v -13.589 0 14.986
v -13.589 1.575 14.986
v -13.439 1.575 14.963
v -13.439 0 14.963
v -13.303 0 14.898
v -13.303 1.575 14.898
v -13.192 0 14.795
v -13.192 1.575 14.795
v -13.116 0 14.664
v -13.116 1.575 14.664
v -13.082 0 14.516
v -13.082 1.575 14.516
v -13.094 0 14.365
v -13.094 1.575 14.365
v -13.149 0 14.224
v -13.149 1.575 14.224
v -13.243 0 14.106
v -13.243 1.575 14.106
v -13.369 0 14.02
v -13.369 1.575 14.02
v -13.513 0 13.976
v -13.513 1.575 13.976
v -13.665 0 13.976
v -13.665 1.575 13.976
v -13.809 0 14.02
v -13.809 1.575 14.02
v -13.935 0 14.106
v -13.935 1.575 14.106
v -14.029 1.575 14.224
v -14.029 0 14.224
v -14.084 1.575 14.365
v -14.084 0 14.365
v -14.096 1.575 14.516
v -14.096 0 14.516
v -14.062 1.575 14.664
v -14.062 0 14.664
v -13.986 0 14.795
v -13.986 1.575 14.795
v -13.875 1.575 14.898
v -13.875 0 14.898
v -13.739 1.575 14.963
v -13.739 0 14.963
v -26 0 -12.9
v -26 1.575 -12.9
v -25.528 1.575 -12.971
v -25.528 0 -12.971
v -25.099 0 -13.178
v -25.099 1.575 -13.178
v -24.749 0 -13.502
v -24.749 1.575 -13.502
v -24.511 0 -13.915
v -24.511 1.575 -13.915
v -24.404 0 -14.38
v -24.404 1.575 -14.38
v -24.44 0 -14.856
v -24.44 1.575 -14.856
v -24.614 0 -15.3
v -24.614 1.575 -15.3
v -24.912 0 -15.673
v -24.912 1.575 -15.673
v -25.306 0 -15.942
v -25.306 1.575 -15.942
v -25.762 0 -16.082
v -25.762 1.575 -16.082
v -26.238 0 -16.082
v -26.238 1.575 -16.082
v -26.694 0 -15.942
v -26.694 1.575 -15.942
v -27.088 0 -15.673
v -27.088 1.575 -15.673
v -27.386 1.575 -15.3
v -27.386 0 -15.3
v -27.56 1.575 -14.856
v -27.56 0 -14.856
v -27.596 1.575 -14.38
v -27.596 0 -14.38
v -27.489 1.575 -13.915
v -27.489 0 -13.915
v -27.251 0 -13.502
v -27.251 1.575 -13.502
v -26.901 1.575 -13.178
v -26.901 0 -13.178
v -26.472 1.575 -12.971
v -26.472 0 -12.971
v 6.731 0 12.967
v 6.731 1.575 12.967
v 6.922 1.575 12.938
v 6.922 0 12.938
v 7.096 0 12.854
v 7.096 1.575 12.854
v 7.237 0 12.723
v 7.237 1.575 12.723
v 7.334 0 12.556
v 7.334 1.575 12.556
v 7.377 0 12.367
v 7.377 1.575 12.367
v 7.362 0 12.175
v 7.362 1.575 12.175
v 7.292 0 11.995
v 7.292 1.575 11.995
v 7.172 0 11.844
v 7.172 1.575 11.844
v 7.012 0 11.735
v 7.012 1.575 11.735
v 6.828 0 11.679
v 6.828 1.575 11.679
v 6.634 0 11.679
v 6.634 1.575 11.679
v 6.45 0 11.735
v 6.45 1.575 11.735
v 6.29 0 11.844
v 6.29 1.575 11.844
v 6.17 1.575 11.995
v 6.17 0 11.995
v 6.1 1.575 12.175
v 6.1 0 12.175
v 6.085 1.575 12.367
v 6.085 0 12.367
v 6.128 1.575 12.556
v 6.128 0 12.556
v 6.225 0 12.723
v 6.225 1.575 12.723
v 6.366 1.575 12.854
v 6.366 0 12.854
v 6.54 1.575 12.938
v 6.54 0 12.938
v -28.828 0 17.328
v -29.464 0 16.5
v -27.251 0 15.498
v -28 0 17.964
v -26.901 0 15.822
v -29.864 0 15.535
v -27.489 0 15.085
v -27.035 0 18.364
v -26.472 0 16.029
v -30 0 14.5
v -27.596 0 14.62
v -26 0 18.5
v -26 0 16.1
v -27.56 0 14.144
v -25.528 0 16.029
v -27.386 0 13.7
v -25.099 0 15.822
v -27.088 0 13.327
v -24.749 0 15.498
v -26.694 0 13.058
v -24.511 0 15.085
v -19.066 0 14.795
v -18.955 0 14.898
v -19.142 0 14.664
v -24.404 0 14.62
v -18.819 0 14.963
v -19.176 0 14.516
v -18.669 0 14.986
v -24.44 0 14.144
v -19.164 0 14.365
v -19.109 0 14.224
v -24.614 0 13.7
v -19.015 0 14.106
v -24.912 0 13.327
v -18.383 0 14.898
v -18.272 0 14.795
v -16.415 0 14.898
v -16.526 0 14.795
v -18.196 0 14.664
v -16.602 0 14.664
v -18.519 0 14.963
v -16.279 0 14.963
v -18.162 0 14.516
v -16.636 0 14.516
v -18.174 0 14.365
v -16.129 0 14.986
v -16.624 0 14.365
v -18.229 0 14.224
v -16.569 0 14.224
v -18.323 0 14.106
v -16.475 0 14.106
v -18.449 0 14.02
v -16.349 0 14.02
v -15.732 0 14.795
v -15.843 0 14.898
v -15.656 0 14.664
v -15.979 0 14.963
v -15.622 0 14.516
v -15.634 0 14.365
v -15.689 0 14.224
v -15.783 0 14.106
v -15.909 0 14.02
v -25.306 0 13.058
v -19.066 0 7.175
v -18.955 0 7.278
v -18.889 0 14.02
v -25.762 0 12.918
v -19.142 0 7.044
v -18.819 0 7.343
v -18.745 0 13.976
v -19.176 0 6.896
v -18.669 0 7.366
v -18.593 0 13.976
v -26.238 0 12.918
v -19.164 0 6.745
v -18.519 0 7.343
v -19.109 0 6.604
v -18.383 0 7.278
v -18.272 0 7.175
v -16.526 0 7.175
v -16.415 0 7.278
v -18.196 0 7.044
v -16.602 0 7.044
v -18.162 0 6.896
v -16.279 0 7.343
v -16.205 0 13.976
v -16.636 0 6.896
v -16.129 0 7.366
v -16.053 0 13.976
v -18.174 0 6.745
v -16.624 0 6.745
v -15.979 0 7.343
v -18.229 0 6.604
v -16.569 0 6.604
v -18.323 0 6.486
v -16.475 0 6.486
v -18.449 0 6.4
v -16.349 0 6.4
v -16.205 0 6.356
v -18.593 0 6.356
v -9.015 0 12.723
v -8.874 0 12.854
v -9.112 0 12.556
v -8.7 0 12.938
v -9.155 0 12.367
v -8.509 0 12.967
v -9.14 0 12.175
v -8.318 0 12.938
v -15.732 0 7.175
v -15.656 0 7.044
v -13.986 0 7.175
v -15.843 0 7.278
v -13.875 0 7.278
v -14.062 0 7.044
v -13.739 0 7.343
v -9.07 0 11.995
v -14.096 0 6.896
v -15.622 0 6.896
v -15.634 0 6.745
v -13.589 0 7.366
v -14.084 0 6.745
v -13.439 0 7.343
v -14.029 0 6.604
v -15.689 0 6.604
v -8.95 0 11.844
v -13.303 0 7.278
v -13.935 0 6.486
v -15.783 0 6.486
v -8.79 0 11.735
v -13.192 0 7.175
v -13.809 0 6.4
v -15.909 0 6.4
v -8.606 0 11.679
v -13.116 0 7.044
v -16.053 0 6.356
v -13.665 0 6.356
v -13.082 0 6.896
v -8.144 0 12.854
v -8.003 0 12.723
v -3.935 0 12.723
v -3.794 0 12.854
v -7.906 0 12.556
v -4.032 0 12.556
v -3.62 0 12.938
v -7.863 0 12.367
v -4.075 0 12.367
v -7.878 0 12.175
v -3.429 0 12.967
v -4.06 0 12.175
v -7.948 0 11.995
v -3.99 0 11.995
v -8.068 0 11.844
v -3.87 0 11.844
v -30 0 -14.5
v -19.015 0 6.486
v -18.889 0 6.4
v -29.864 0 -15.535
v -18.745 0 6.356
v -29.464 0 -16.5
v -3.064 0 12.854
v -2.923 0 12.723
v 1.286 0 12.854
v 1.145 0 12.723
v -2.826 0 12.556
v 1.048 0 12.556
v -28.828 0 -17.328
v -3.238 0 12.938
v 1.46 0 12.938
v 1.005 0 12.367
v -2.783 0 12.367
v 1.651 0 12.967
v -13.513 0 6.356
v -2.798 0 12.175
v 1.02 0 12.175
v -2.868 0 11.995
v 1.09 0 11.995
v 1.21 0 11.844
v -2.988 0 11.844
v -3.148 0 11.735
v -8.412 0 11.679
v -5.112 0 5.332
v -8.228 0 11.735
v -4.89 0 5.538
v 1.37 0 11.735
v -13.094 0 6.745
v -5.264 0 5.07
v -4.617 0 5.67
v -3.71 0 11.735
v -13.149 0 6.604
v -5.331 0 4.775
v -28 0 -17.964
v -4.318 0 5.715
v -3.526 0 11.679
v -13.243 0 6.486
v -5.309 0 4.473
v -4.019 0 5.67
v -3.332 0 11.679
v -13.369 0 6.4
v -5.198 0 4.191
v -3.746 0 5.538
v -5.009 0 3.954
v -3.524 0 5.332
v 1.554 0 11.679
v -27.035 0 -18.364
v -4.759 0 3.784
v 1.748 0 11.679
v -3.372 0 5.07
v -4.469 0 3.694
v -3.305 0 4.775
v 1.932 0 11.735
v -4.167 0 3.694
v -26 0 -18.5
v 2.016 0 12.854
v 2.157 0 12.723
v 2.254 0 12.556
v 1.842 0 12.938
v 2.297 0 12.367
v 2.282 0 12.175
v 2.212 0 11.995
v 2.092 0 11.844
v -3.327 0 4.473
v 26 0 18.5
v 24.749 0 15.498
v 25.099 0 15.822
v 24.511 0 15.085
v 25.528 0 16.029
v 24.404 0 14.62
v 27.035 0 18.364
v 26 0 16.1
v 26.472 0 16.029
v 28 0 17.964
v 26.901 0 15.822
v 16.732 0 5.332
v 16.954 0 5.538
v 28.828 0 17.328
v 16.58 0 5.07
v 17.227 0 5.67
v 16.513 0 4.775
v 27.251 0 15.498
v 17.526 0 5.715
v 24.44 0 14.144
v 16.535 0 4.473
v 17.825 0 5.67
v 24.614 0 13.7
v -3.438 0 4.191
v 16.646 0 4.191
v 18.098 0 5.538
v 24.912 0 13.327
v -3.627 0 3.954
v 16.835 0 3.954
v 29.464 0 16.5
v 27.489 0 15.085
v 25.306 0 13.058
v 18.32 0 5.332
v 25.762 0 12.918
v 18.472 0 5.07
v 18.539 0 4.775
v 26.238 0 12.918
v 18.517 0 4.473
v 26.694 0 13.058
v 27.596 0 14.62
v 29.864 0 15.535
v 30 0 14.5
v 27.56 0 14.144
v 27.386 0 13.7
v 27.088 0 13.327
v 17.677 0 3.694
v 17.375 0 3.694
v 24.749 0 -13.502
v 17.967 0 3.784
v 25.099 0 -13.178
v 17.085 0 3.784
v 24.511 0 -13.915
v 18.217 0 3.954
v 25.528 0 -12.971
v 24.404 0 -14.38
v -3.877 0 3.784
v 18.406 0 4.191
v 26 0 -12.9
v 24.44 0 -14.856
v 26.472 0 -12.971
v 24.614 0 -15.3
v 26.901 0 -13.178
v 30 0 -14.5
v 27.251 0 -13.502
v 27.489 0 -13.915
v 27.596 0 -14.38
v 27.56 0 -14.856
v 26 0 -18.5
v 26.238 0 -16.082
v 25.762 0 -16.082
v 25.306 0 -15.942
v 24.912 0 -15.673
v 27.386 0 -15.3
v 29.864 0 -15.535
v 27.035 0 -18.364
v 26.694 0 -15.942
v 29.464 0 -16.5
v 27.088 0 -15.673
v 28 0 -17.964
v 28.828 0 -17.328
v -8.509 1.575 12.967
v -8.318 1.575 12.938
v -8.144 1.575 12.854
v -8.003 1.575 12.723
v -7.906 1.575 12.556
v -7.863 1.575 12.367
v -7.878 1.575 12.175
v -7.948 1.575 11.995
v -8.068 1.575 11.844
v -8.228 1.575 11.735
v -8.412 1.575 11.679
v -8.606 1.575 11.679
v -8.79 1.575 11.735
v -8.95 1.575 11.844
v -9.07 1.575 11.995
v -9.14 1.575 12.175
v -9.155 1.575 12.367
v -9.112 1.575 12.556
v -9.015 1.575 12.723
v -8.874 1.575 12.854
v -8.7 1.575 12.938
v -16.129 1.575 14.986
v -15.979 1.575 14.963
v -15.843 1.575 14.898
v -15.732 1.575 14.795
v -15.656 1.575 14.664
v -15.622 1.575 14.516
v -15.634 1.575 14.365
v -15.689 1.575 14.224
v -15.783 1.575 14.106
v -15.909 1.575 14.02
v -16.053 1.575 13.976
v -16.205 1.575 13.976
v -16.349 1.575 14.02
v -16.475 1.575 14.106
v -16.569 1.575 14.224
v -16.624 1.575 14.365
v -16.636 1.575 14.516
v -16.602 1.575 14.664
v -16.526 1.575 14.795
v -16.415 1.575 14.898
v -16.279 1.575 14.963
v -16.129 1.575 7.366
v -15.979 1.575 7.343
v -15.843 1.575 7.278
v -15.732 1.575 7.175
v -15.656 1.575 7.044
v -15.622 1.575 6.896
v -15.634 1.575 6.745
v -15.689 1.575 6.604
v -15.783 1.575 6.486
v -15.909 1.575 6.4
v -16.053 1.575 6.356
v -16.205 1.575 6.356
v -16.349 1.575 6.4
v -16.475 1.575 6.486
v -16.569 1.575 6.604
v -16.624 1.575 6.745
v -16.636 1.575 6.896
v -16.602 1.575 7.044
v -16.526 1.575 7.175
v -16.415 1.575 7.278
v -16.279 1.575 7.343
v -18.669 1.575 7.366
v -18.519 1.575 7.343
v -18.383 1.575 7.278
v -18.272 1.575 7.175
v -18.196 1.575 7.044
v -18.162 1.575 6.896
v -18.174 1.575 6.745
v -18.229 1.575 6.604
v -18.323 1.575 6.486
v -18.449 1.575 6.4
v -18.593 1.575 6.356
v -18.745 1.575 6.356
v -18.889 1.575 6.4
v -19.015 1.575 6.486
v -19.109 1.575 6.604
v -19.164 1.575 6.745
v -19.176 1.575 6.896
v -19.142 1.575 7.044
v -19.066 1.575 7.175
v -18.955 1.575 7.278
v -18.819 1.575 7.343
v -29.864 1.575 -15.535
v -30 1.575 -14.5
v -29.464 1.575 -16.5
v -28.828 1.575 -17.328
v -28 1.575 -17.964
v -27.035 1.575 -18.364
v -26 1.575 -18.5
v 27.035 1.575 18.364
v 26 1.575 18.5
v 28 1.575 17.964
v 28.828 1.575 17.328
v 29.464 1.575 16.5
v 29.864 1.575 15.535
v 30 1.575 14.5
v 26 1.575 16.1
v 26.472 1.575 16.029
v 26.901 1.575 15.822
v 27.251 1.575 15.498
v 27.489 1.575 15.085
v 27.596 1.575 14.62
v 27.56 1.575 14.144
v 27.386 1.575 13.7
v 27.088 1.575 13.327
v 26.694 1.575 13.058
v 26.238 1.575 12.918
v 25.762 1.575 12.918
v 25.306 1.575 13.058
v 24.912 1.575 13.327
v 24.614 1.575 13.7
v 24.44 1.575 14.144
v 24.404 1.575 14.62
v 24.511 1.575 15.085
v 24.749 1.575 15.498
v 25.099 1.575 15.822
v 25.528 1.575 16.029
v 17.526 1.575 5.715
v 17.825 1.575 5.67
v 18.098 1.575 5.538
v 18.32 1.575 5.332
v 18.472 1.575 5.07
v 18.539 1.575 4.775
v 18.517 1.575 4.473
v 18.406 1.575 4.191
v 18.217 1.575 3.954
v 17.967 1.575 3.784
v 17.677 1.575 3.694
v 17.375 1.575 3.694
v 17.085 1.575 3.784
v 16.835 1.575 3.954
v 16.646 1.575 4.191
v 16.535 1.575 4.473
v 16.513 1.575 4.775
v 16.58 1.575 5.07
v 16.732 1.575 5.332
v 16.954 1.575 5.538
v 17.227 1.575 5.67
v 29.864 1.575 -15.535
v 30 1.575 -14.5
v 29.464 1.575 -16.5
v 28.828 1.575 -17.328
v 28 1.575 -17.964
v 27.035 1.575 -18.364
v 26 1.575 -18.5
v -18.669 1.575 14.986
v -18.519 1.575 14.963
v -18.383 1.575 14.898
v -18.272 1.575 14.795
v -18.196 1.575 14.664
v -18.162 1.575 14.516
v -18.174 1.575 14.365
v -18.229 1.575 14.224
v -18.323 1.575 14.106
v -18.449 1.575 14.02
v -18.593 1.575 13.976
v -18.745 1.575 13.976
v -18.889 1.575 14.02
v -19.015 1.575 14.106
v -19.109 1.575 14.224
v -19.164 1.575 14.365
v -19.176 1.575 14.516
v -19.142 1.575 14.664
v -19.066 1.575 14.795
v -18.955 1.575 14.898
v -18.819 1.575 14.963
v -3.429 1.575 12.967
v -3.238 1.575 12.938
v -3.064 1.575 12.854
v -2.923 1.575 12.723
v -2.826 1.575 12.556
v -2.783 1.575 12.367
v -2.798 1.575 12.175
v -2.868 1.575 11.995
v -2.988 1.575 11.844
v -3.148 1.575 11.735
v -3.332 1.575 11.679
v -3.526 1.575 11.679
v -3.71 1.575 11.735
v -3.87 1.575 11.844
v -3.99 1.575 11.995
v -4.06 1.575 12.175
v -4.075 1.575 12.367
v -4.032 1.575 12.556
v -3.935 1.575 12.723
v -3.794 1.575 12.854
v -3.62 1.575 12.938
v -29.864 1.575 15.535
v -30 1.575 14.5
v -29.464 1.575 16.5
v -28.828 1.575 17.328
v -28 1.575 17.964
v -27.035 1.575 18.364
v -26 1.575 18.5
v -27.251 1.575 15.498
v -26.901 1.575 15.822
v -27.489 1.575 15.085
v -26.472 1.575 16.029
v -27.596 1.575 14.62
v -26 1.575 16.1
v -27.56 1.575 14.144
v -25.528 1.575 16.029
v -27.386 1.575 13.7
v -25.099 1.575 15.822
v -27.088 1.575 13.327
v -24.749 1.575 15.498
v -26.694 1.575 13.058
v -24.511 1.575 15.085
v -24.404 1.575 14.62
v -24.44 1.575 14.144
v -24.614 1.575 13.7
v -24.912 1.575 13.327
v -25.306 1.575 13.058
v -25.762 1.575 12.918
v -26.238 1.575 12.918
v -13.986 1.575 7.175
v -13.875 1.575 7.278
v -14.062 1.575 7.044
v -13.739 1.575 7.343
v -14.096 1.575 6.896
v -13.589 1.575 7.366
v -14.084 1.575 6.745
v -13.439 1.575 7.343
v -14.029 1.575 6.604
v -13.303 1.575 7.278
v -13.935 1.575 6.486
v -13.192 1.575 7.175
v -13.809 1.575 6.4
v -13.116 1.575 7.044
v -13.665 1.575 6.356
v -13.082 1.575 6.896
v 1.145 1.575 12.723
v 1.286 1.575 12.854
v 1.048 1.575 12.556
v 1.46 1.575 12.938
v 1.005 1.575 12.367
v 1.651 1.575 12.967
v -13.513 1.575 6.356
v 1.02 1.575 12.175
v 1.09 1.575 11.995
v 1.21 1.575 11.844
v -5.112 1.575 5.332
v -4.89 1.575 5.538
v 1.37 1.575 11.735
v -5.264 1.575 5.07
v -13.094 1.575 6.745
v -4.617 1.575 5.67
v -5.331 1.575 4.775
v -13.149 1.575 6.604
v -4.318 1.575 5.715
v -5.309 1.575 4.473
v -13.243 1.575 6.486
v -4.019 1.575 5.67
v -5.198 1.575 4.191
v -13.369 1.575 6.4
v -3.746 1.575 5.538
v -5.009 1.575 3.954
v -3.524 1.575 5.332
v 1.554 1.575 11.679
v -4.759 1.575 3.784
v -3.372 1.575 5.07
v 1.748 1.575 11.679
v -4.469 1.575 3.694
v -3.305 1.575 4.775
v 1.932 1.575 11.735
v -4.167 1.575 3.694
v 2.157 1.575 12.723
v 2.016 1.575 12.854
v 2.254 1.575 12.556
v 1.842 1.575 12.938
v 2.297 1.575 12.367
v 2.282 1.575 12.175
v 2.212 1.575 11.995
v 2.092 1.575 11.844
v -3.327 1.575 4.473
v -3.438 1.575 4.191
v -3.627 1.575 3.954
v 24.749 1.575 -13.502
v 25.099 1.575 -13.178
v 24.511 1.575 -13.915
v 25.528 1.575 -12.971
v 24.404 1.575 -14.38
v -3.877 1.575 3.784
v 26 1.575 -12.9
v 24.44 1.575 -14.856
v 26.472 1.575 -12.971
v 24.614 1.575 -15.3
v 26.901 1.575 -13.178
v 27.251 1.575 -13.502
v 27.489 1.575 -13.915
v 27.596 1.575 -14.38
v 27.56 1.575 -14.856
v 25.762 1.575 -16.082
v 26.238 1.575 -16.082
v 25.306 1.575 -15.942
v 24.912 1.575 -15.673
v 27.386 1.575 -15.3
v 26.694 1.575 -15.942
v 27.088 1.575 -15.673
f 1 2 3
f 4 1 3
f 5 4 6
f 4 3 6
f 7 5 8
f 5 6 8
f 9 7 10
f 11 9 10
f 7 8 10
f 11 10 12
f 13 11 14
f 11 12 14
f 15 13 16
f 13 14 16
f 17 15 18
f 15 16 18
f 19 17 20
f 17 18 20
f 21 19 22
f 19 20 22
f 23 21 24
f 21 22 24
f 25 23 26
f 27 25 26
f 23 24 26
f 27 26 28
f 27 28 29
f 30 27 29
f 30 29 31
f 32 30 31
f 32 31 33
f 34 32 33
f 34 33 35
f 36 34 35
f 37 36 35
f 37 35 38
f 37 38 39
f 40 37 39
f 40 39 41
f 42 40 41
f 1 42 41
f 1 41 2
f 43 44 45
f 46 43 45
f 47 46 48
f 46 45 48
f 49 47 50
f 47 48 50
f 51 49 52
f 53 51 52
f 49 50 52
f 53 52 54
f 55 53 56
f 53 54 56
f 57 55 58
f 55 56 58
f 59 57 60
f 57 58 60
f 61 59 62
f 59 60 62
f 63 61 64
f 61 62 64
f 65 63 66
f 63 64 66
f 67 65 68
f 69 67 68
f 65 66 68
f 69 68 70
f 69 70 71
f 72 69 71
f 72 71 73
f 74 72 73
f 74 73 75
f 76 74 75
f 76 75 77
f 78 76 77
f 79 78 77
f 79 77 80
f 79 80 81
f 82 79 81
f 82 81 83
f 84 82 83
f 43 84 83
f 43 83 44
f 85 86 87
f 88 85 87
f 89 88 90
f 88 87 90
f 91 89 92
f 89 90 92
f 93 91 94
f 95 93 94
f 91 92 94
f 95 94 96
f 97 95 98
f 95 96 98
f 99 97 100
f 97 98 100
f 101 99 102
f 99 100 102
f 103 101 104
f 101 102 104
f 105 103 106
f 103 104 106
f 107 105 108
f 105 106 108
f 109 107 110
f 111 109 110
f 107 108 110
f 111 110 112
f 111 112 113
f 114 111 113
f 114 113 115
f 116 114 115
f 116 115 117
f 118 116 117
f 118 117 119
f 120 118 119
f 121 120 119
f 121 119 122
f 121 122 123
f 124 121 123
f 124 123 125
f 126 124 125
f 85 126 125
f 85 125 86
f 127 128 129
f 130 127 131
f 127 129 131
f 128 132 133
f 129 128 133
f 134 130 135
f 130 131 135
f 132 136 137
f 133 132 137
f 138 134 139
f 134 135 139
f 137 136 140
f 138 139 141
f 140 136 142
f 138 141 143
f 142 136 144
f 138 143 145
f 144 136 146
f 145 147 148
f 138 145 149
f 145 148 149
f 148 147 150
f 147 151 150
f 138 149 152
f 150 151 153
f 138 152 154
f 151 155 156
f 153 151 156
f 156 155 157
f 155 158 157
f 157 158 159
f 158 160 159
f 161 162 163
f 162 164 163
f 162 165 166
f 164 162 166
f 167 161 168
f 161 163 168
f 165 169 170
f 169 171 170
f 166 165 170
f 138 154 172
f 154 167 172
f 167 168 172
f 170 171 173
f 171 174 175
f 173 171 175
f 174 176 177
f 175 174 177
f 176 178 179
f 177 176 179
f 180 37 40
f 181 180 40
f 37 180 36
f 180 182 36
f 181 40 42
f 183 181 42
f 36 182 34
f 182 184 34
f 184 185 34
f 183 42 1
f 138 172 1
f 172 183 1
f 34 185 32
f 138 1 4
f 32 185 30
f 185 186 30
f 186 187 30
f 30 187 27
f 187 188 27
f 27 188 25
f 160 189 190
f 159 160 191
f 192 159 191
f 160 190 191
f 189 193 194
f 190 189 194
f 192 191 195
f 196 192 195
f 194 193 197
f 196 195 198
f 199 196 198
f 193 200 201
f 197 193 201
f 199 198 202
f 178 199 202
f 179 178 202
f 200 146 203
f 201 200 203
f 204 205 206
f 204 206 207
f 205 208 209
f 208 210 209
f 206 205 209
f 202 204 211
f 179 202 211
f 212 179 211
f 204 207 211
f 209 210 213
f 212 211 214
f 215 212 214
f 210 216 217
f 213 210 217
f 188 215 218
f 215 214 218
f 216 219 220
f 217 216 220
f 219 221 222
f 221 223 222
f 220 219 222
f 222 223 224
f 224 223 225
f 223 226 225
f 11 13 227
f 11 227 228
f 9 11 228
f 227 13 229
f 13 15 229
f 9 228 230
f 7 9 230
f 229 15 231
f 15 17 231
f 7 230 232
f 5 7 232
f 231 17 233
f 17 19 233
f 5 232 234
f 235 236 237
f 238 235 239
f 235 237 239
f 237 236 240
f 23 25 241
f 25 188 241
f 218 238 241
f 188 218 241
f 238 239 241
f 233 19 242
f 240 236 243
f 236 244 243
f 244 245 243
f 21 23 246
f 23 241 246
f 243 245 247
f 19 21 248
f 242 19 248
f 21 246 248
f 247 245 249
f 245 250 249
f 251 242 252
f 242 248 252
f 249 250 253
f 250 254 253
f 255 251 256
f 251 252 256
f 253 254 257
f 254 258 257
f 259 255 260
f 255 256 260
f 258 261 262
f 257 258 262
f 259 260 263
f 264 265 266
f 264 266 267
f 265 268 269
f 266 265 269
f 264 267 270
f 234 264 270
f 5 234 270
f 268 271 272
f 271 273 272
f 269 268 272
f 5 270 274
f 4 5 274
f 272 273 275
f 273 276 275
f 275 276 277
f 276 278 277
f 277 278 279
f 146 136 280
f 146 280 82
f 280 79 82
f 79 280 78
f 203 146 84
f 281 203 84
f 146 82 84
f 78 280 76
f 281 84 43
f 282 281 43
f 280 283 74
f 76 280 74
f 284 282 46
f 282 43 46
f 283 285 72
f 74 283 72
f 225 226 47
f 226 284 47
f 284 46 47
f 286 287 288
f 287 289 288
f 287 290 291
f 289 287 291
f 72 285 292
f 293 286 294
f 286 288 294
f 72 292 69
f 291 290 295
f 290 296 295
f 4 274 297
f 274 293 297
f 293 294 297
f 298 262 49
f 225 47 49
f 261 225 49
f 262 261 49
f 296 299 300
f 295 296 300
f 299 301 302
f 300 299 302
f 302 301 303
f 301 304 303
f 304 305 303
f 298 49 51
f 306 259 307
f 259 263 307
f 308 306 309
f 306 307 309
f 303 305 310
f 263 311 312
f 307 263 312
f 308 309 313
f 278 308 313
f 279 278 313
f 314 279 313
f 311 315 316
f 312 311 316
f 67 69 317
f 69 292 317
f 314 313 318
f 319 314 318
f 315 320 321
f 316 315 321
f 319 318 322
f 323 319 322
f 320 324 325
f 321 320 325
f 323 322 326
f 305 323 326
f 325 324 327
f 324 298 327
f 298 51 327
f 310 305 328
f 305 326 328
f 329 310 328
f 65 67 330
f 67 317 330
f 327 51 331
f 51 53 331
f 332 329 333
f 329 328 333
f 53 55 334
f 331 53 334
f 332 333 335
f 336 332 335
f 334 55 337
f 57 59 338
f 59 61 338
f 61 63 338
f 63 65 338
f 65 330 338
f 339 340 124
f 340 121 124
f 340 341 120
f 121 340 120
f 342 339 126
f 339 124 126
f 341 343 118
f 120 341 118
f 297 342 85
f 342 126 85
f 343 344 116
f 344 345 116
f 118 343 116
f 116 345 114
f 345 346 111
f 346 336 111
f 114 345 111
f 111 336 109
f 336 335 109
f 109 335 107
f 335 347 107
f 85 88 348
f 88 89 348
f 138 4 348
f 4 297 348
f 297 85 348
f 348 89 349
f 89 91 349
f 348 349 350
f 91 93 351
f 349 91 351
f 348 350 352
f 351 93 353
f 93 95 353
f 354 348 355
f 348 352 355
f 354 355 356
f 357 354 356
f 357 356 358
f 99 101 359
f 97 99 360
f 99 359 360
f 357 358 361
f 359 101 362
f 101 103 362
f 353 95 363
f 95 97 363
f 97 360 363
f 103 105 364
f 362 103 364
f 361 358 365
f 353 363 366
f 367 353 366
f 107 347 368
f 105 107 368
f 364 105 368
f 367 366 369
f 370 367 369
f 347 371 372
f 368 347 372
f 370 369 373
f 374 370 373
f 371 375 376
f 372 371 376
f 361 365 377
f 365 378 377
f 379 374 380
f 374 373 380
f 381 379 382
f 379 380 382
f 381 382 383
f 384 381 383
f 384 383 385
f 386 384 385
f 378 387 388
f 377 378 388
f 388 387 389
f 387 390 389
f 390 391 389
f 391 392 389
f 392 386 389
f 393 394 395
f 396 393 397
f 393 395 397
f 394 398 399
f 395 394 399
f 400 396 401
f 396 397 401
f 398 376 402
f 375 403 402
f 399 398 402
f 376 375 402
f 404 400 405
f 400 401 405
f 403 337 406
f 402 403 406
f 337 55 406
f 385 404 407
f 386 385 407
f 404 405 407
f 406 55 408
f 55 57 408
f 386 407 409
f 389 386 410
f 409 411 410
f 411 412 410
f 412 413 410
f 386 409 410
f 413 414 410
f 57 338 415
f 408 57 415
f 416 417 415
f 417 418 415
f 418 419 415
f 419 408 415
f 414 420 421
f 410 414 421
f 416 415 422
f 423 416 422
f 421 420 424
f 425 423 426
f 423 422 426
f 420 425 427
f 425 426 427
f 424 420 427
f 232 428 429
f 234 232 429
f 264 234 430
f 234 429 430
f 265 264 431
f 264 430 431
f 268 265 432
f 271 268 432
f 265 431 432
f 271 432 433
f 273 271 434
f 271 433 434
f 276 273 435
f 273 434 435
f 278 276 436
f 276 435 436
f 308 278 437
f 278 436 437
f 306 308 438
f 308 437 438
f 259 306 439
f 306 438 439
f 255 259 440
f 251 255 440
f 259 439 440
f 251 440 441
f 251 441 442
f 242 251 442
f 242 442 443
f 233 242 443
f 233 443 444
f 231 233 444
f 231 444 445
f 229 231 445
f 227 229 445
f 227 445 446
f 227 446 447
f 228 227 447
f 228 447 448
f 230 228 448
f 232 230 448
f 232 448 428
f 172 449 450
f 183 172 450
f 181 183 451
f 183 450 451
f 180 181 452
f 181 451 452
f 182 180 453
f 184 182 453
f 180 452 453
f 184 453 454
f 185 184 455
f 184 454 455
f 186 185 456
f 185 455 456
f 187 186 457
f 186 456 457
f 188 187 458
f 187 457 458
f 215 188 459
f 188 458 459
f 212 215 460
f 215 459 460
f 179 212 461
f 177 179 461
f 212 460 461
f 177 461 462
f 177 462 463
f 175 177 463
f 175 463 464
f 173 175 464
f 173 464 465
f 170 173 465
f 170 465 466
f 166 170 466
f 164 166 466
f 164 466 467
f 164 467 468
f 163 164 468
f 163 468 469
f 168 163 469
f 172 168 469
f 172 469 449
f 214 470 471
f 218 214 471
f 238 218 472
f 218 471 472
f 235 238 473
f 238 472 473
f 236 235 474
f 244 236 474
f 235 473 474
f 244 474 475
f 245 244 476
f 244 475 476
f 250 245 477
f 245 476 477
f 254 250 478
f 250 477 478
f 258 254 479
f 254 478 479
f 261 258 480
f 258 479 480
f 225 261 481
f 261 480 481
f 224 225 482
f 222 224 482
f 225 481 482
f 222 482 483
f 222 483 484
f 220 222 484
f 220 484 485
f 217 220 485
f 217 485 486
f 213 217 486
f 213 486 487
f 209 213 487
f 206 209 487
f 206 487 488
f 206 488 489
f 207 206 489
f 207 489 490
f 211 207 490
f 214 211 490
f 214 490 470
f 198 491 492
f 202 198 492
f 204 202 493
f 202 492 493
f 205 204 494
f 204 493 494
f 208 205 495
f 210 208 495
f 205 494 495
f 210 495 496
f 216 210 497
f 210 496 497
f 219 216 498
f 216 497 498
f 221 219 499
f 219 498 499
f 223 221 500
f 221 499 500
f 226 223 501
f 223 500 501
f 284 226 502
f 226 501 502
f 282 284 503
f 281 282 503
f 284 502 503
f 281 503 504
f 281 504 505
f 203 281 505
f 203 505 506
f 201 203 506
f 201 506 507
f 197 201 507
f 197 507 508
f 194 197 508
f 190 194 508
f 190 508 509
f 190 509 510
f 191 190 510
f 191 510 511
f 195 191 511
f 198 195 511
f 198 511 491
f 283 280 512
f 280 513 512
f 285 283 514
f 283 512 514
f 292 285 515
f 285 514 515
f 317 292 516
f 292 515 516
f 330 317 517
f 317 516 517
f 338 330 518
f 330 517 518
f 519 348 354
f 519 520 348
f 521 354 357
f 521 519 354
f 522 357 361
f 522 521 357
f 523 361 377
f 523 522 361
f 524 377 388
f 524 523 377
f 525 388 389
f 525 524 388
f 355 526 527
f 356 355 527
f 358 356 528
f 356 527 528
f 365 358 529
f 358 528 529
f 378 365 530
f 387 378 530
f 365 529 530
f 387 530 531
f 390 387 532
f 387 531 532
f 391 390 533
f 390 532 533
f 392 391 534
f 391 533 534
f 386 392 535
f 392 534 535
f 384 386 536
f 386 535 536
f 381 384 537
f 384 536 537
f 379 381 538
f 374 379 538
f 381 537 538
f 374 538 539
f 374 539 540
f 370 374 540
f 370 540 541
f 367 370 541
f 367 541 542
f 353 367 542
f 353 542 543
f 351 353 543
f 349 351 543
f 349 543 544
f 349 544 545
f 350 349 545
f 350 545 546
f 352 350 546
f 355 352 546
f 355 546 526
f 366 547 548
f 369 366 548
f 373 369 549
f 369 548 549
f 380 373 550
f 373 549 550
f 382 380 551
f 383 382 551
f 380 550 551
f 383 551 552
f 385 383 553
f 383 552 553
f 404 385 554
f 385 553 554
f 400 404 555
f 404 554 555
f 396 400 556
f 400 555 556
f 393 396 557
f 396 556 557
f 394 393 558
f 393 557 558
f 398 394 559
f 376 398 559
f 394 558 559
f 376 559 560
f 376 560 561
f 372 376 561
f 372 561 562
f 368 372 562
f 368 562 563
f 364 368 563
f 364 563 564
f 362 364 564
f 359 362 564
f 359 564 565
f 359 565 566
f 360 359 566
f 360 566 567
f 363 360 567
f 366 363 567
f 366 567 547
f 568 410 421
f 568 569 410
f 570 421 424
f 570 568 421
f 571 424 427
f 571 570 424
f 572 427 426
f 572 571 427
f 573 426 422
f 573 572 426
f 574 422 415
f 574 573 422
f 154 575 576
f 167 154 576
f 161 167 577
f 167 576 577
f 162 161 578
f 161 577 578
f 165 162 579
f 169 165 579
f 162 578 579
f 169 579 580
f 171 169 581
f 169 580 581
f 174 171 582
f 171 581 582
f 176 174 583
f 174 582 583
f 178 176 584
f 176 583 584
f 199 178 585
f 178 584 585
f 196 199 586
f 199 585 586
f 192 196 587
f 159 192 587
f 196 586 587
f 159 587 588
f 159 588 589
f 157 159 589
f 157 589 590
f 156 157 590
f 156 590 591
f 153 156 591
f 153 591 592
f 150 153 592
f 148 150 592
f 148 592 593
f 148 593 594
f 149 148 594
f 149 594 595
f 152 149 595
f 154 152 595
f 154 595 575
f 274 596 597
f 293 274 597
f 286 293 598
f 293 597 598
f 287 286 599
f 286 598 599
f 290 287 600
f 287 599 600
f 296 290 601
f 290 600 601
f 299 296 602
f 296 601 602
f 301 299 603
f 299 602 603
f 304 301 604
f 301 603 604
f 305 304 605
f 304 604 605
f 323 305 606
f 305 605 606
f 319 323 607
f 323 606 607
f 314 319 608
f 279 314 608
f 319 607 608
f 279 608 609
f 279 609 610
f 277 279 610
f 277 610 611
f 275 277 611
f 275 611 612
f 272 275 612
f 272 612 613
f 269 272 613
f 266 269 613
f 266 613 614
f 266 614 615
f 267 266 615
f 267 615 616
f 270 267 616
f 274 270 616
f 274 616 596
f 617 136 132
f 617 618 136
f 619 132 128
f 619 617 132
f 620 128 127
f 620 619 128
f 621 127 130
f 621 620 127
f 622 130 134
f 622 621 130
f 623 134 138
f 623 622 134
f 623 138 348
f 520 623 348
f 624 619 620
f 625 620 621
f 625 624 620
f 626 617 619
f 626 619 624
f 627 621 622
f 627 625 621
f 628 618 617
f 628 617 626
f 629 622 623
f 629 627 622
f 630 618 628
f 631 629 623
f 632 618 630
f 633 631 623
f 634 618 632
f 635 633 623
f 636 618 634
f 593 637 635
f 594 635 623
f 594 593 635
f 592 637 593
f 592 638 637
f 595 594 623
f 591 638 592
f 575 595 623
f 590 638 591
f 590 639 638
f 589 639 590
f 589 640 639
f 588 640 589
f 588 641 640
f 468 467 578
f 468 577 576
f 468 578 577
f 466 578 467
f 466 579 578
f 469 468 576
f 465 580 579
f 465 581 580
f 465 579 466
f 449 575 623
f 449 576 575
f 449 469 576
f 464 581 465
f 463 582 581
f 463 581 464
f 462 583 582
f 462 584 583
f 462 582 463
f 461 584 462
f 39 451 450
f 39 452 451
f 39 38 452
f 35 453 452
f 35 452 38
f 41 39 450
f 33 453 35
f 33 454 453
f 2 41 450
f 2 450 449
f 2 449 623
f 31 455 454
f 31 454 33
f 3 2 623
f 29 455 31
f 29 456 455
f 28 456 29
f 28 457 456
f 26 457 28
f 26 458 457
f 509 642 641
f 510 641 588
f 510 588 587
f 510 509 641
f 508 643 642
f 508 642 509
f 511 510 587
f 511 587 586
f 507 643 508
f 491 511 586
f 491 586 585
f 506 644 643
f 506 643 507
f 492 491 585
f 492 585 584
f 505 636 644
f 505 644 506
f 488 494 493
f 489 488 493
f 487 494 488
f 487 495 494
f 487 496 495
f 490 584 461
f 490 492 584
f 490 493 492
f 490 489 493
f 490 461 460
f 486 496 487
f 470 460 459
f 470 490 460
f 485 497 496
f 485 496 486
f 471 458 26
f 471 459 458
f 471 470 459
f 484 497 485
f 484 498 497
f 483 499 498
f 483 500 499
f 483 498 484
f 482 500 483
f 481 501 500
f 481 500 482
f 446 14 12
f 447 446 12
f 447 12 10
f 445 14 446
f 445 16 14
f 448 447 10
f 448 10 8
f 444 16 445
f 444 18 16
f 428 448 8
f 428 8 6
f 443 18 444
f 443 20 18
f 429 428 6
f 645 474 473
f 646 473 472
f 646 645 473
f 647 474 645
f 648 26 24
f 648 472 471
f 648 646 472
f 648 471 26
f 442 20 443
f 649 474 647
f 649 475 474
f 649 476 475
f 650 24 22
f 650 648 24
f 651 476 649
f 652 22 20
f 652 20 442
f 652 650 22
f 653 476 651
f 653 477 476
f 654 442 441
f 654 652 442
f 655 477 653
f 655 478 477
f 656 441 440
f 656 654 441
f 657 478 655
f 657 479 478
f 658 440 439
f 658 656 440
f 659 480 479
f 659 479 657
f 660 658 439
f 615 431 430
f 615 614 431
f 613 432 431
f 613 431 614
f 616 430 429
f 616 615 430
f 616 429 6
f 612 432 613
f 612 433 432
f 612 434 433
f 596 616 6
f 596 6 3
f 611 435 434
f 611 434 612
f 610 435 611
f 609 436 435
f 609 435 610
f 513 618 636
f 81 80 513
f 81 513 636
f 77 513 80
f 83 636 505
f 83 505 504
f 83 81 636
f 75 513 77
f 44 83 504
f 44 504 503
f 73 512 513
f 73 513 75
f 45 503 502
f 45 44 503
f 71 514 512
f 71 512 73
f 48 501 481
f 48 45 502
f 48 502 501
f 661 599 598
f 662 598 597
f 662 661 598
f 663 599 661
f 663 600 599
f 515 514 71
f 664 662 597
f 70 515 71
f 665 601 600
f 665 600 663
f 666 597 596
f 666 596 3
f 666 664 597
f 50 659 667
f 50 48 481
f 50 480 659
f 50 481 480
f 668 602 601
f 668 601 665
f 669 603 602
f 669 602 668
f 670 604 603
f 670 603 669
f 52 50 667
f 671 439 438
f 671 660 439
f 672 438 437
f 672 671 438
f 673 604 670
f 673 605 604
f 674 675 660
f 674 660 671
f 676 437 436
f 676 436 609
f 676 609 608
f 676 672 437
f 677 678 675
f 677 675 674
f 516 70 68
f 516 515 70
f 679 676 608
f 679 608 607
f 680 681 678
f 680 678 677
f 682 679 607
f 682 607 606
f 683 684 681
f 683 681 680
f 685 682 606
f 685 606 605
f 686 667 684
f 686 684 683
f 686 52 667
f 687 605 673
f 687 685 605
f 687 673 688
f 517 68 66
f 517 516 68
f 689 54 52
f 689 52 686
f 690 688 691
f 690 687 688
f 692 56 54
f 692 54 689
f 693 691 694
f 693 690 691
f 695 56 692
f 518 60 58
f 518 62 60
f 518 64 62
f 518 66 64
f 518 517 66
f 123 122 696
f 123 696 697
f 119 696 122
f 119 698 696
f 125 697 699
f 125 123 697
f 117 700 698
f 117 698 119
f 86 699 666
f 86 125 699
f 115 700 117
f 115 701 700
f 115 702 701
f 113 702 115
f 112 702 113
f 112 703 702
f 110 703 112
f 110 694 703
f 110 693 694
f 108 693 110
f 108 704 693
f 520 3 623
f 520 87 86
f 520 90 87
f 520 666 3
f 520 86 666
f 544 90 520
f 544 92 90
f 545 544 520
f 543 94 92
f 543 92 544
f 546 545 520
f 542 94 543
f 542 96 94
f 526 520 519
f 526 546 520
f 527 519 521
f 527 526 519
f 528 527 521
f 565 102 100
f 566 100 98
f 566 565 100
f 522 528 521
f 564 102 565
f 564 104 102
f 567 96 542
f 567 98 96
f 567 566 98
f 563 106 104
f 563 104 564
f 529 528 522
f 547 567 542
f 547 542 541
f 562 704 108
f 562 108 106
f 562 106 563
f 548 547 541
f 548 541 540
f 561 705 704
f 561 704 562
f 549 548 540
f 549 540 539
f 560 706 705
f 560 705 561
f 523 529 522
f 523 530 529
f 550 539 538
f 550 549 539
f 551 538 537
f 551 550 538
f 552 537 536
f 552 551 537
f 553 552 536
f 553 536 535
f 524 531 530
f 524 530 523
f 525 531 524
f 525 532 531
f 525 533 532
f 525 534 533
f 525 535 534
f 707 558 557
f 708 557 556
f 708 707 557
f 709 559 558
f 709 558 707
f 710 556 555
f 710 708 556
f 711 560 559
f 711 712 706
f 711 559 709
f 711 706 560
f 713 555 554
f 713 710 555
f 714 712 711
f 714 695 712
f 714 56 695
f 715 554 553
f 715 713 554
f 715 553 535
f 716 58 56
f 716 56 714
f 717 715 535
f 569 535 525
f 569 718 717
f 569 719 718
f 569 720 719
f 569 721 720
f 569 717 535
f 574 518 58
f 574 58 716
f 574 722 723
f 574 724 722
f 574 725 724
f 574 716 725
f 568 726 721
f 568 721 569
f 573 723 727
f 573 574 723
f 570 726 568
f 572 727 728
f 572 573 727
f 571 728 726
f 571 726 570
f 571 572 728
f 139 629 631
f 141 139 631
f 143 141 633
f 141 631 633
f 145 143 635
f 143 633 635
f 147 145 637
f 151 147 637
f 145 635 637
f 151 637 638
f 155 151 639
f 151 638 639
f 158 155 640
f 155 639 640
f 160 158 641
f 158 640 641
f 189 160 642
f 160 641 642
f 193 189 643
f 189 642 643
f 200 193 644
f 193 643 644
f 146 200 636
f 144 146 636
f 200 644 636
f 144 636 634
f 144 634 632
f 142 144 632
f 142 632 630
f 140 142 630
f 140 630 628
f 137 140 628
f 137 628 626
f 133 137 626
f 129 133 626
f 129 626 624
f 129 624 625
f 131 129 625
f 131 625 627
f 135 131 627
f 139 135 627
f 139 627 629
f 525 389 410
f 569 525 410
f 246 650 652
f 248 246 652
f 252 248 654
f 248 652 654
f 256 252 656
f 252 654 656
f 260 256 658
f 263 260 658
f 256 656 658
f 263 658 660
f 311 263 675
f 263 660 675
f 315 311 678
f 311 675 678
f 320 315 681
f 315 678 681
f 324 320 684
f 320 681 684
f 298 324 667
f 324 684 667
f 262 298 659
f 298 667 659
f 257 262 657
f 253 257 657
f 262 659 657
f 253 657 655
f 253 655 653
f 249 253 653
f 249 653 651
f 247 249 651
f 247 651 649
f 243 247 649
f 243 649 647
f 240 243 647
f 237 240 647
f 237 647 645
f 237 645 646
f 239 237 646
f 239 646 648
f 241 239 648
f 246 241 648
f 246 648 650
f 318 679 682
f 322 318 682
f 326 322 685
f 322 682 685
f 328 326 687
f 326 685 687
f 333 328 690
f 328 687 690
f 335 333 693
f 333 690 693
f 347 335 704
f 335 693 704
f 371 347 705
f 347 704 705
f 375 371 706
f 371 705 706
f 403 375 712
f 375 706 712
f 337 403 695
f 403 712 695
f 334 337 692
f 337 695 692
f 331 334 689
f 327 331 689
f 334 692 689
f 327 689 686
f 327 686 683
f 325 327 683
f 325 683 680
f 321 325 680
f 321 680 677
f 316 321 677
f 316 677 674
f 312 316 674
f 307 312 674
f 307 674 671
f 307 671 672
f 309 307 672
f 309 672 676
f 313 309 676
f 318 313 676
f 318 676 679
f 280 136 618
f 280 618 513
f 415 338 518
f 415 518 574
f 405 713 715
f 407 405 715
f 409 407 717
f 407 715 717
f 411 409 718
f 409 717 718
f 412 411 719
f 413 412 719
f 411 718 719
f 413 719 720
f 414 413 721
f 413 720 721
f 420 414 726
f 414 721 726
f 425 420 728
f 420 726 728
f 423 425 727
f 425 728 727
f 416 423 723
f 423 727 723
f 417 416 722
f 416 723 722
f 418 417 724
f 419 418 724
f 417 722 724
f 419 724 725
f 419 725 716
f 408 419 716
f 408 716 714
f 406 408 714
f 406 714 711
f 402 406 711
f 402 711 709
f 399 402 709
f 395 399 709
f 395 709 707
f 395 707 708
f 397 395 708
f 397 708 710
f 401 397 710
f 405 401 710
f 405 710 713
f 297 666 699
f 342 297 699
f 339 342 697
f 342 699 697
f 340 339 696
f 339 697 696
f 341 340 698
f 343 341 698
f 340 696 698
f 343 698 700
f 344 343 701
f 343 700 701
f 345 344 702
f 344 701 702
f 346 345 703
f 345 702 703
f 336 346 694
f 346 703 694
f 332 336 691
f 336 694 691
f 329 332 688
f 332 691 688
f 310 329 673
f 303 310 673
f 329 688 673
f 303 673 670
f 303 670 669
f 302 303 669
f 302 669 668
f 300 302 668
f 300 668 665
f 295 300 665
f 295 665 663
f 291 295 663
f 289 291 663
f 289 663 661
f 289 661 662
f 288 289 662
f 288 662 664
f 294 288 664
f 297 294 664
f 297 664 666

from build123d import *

# Parameters (mm, degrees)
SKETCH1_W            = 60
SKETCH1_H            = 37
BOSS_EXTRUDE1_DEPTH  = 1.5748
FILLET1_R            = 4
SKETCH2_R            = 1.6
CUT_EXTRUDE1_DEPTH   = 36.280731215
SKETCH3_R            = 1.016
CUT_EXTRUDE2_DEPTH   = 36.280731215
SKETCH4_R            = 0.6477
CUT_EXTRUDE3_DEPTH   = 36.280731215
LPATTERN1_COUNT      = 4
LPATTERN1_PITCH      = 5.08
SKETCH5_R            = 0.508
CUT_EXTRUDE4_DEPTH   = 36.280731215
LPATTERN2_COUNT      = 3
LPATTERN2_PITCH      = 2.54
LPATTERN2_COUNT_DIR2 = 2
LPATTERN2_PITCH_DIR2 = 7.62


with BuildPart() as part:
    # Sketch1 → Boss-Extrude1 (new body)
    with BuildSketch(Plane(origin=(0, 0, 0), x_dir=(1, 0, 0), z_dir=(0, 1, 0))):
        Rectangle(SKETCH1_W, SKETCH1_H)
    extrude(amount=BOSS_EXTRUDE1_DEPTH)

    # Fillet1
    fillet1_edges = [part.edges().sort_by_distance(p)[0] for p in [
        (30, 0.7874, 18.5),
        (-30, 0.7874, 18.5),
        (-30, 0.7874, -18.5),
        (30, 0.7874, -18.5),
    ]]
    fillet(fillet1_edges, radius=FILLET1_R)

    # Sketch2 → Cut-Extrude1 (cut, through all)
    with BuildSketch(Plane(origin=(0, 1.5748, 0), x_dir=(1, 0, 0), z_dir=(0, 1, 0))):
        with Locations(Location((-26, 14.5, 0), (0, 0, 270))):
            Circle(SKETCH2_R)
        with Locations(Location((-26, -14.5, 0), (0, 0, 270))):
            Circle(SKETCH2_R)
        with Locations(Location((26, -14.5, 0), (0, 0, 270))):
            Circle(SKETCH2_R)
        with Locations(Location((26, 14.5, 0), (0, 0, 270))):
            Circle(SKETCH2_R)
    extrude(amount=-CUT_EXTRUDE1_DEPTH, mode=Mode.SUBTRACT)

    # Sketch3 → Cut-Extrude2 (cut, through all)
    with BuildSketch(Plane(origin=(0, 1.5748, 0), x_dir=(-1, 0, 0), z_dir=(0, 1, 0))):
        with Locations(Location((4.318, 4.699, 0), (0, 0, 90))):
            Circle(SKETCH3_R)
        with Locations(Location((-17.526, 4.699, 0), (0, 0, 90))):
            Circle(SKETCH3_R)
    extrude(amount=-CUT_EXTRUDE2_DEPTH, mode=Mode.SUBTRACT)

    # Sketch4 → Cut-Extrude3 (cut, through all)
    with BuildSketch(Plane(origin=(0, 1.5748, 0), x_dir=(1, 0, 0), z_dir=(0, 1, 0))):
        with Locations(Location((6.731, -12.319, 0), (0, 0, 270))):
            Circle(SKETCH4_R)
    cut_extrude3 = extrude(amount=-CUT_EXTRUDE3_DEPTH, mode=Mode.SUBTRACT)

    # LPattern1: Cut-Extrude3 ×4
    with Locations(*[(-i * LPATTERN1_PITCH, 0, 0) for i in range(1, LPATTERN1_COUNT)]):
        add(cut_extrude3, mode=Mode.SUBTRACT)

    # Sketch5 → Cut-Extrude4 (cut, through all)
    with BuildSketch(Plane(origin=(0, 1.5748, 0), x_dir=(1, 0, 0), z_dir=(0, 1, 0))):
        with Locations(Location((-13.589, -14.478, 0), (0, 0, 270))):
            Circle(SKETCH5_R)
    cut_extrude4 = extrude(amount=-CUT_EXTRUDE4_DEPTH, mode=Mode.SUBTRACT)

    # LPattern2: Cut-Extrude4 3 × 2
    with Locations(*[(-i * LPATTERN2_PITCH, 0, -j * LPATTERN2_PITCH_DIR2) for i in range(LPATTERN2_COUNT) for j in range(LPATTERN2_COUNT_DIR2) if (i, j) != (0, 0)]):
        add(cut_extrude4, mode=Mode.SUBTRACT)


solid = part.part
